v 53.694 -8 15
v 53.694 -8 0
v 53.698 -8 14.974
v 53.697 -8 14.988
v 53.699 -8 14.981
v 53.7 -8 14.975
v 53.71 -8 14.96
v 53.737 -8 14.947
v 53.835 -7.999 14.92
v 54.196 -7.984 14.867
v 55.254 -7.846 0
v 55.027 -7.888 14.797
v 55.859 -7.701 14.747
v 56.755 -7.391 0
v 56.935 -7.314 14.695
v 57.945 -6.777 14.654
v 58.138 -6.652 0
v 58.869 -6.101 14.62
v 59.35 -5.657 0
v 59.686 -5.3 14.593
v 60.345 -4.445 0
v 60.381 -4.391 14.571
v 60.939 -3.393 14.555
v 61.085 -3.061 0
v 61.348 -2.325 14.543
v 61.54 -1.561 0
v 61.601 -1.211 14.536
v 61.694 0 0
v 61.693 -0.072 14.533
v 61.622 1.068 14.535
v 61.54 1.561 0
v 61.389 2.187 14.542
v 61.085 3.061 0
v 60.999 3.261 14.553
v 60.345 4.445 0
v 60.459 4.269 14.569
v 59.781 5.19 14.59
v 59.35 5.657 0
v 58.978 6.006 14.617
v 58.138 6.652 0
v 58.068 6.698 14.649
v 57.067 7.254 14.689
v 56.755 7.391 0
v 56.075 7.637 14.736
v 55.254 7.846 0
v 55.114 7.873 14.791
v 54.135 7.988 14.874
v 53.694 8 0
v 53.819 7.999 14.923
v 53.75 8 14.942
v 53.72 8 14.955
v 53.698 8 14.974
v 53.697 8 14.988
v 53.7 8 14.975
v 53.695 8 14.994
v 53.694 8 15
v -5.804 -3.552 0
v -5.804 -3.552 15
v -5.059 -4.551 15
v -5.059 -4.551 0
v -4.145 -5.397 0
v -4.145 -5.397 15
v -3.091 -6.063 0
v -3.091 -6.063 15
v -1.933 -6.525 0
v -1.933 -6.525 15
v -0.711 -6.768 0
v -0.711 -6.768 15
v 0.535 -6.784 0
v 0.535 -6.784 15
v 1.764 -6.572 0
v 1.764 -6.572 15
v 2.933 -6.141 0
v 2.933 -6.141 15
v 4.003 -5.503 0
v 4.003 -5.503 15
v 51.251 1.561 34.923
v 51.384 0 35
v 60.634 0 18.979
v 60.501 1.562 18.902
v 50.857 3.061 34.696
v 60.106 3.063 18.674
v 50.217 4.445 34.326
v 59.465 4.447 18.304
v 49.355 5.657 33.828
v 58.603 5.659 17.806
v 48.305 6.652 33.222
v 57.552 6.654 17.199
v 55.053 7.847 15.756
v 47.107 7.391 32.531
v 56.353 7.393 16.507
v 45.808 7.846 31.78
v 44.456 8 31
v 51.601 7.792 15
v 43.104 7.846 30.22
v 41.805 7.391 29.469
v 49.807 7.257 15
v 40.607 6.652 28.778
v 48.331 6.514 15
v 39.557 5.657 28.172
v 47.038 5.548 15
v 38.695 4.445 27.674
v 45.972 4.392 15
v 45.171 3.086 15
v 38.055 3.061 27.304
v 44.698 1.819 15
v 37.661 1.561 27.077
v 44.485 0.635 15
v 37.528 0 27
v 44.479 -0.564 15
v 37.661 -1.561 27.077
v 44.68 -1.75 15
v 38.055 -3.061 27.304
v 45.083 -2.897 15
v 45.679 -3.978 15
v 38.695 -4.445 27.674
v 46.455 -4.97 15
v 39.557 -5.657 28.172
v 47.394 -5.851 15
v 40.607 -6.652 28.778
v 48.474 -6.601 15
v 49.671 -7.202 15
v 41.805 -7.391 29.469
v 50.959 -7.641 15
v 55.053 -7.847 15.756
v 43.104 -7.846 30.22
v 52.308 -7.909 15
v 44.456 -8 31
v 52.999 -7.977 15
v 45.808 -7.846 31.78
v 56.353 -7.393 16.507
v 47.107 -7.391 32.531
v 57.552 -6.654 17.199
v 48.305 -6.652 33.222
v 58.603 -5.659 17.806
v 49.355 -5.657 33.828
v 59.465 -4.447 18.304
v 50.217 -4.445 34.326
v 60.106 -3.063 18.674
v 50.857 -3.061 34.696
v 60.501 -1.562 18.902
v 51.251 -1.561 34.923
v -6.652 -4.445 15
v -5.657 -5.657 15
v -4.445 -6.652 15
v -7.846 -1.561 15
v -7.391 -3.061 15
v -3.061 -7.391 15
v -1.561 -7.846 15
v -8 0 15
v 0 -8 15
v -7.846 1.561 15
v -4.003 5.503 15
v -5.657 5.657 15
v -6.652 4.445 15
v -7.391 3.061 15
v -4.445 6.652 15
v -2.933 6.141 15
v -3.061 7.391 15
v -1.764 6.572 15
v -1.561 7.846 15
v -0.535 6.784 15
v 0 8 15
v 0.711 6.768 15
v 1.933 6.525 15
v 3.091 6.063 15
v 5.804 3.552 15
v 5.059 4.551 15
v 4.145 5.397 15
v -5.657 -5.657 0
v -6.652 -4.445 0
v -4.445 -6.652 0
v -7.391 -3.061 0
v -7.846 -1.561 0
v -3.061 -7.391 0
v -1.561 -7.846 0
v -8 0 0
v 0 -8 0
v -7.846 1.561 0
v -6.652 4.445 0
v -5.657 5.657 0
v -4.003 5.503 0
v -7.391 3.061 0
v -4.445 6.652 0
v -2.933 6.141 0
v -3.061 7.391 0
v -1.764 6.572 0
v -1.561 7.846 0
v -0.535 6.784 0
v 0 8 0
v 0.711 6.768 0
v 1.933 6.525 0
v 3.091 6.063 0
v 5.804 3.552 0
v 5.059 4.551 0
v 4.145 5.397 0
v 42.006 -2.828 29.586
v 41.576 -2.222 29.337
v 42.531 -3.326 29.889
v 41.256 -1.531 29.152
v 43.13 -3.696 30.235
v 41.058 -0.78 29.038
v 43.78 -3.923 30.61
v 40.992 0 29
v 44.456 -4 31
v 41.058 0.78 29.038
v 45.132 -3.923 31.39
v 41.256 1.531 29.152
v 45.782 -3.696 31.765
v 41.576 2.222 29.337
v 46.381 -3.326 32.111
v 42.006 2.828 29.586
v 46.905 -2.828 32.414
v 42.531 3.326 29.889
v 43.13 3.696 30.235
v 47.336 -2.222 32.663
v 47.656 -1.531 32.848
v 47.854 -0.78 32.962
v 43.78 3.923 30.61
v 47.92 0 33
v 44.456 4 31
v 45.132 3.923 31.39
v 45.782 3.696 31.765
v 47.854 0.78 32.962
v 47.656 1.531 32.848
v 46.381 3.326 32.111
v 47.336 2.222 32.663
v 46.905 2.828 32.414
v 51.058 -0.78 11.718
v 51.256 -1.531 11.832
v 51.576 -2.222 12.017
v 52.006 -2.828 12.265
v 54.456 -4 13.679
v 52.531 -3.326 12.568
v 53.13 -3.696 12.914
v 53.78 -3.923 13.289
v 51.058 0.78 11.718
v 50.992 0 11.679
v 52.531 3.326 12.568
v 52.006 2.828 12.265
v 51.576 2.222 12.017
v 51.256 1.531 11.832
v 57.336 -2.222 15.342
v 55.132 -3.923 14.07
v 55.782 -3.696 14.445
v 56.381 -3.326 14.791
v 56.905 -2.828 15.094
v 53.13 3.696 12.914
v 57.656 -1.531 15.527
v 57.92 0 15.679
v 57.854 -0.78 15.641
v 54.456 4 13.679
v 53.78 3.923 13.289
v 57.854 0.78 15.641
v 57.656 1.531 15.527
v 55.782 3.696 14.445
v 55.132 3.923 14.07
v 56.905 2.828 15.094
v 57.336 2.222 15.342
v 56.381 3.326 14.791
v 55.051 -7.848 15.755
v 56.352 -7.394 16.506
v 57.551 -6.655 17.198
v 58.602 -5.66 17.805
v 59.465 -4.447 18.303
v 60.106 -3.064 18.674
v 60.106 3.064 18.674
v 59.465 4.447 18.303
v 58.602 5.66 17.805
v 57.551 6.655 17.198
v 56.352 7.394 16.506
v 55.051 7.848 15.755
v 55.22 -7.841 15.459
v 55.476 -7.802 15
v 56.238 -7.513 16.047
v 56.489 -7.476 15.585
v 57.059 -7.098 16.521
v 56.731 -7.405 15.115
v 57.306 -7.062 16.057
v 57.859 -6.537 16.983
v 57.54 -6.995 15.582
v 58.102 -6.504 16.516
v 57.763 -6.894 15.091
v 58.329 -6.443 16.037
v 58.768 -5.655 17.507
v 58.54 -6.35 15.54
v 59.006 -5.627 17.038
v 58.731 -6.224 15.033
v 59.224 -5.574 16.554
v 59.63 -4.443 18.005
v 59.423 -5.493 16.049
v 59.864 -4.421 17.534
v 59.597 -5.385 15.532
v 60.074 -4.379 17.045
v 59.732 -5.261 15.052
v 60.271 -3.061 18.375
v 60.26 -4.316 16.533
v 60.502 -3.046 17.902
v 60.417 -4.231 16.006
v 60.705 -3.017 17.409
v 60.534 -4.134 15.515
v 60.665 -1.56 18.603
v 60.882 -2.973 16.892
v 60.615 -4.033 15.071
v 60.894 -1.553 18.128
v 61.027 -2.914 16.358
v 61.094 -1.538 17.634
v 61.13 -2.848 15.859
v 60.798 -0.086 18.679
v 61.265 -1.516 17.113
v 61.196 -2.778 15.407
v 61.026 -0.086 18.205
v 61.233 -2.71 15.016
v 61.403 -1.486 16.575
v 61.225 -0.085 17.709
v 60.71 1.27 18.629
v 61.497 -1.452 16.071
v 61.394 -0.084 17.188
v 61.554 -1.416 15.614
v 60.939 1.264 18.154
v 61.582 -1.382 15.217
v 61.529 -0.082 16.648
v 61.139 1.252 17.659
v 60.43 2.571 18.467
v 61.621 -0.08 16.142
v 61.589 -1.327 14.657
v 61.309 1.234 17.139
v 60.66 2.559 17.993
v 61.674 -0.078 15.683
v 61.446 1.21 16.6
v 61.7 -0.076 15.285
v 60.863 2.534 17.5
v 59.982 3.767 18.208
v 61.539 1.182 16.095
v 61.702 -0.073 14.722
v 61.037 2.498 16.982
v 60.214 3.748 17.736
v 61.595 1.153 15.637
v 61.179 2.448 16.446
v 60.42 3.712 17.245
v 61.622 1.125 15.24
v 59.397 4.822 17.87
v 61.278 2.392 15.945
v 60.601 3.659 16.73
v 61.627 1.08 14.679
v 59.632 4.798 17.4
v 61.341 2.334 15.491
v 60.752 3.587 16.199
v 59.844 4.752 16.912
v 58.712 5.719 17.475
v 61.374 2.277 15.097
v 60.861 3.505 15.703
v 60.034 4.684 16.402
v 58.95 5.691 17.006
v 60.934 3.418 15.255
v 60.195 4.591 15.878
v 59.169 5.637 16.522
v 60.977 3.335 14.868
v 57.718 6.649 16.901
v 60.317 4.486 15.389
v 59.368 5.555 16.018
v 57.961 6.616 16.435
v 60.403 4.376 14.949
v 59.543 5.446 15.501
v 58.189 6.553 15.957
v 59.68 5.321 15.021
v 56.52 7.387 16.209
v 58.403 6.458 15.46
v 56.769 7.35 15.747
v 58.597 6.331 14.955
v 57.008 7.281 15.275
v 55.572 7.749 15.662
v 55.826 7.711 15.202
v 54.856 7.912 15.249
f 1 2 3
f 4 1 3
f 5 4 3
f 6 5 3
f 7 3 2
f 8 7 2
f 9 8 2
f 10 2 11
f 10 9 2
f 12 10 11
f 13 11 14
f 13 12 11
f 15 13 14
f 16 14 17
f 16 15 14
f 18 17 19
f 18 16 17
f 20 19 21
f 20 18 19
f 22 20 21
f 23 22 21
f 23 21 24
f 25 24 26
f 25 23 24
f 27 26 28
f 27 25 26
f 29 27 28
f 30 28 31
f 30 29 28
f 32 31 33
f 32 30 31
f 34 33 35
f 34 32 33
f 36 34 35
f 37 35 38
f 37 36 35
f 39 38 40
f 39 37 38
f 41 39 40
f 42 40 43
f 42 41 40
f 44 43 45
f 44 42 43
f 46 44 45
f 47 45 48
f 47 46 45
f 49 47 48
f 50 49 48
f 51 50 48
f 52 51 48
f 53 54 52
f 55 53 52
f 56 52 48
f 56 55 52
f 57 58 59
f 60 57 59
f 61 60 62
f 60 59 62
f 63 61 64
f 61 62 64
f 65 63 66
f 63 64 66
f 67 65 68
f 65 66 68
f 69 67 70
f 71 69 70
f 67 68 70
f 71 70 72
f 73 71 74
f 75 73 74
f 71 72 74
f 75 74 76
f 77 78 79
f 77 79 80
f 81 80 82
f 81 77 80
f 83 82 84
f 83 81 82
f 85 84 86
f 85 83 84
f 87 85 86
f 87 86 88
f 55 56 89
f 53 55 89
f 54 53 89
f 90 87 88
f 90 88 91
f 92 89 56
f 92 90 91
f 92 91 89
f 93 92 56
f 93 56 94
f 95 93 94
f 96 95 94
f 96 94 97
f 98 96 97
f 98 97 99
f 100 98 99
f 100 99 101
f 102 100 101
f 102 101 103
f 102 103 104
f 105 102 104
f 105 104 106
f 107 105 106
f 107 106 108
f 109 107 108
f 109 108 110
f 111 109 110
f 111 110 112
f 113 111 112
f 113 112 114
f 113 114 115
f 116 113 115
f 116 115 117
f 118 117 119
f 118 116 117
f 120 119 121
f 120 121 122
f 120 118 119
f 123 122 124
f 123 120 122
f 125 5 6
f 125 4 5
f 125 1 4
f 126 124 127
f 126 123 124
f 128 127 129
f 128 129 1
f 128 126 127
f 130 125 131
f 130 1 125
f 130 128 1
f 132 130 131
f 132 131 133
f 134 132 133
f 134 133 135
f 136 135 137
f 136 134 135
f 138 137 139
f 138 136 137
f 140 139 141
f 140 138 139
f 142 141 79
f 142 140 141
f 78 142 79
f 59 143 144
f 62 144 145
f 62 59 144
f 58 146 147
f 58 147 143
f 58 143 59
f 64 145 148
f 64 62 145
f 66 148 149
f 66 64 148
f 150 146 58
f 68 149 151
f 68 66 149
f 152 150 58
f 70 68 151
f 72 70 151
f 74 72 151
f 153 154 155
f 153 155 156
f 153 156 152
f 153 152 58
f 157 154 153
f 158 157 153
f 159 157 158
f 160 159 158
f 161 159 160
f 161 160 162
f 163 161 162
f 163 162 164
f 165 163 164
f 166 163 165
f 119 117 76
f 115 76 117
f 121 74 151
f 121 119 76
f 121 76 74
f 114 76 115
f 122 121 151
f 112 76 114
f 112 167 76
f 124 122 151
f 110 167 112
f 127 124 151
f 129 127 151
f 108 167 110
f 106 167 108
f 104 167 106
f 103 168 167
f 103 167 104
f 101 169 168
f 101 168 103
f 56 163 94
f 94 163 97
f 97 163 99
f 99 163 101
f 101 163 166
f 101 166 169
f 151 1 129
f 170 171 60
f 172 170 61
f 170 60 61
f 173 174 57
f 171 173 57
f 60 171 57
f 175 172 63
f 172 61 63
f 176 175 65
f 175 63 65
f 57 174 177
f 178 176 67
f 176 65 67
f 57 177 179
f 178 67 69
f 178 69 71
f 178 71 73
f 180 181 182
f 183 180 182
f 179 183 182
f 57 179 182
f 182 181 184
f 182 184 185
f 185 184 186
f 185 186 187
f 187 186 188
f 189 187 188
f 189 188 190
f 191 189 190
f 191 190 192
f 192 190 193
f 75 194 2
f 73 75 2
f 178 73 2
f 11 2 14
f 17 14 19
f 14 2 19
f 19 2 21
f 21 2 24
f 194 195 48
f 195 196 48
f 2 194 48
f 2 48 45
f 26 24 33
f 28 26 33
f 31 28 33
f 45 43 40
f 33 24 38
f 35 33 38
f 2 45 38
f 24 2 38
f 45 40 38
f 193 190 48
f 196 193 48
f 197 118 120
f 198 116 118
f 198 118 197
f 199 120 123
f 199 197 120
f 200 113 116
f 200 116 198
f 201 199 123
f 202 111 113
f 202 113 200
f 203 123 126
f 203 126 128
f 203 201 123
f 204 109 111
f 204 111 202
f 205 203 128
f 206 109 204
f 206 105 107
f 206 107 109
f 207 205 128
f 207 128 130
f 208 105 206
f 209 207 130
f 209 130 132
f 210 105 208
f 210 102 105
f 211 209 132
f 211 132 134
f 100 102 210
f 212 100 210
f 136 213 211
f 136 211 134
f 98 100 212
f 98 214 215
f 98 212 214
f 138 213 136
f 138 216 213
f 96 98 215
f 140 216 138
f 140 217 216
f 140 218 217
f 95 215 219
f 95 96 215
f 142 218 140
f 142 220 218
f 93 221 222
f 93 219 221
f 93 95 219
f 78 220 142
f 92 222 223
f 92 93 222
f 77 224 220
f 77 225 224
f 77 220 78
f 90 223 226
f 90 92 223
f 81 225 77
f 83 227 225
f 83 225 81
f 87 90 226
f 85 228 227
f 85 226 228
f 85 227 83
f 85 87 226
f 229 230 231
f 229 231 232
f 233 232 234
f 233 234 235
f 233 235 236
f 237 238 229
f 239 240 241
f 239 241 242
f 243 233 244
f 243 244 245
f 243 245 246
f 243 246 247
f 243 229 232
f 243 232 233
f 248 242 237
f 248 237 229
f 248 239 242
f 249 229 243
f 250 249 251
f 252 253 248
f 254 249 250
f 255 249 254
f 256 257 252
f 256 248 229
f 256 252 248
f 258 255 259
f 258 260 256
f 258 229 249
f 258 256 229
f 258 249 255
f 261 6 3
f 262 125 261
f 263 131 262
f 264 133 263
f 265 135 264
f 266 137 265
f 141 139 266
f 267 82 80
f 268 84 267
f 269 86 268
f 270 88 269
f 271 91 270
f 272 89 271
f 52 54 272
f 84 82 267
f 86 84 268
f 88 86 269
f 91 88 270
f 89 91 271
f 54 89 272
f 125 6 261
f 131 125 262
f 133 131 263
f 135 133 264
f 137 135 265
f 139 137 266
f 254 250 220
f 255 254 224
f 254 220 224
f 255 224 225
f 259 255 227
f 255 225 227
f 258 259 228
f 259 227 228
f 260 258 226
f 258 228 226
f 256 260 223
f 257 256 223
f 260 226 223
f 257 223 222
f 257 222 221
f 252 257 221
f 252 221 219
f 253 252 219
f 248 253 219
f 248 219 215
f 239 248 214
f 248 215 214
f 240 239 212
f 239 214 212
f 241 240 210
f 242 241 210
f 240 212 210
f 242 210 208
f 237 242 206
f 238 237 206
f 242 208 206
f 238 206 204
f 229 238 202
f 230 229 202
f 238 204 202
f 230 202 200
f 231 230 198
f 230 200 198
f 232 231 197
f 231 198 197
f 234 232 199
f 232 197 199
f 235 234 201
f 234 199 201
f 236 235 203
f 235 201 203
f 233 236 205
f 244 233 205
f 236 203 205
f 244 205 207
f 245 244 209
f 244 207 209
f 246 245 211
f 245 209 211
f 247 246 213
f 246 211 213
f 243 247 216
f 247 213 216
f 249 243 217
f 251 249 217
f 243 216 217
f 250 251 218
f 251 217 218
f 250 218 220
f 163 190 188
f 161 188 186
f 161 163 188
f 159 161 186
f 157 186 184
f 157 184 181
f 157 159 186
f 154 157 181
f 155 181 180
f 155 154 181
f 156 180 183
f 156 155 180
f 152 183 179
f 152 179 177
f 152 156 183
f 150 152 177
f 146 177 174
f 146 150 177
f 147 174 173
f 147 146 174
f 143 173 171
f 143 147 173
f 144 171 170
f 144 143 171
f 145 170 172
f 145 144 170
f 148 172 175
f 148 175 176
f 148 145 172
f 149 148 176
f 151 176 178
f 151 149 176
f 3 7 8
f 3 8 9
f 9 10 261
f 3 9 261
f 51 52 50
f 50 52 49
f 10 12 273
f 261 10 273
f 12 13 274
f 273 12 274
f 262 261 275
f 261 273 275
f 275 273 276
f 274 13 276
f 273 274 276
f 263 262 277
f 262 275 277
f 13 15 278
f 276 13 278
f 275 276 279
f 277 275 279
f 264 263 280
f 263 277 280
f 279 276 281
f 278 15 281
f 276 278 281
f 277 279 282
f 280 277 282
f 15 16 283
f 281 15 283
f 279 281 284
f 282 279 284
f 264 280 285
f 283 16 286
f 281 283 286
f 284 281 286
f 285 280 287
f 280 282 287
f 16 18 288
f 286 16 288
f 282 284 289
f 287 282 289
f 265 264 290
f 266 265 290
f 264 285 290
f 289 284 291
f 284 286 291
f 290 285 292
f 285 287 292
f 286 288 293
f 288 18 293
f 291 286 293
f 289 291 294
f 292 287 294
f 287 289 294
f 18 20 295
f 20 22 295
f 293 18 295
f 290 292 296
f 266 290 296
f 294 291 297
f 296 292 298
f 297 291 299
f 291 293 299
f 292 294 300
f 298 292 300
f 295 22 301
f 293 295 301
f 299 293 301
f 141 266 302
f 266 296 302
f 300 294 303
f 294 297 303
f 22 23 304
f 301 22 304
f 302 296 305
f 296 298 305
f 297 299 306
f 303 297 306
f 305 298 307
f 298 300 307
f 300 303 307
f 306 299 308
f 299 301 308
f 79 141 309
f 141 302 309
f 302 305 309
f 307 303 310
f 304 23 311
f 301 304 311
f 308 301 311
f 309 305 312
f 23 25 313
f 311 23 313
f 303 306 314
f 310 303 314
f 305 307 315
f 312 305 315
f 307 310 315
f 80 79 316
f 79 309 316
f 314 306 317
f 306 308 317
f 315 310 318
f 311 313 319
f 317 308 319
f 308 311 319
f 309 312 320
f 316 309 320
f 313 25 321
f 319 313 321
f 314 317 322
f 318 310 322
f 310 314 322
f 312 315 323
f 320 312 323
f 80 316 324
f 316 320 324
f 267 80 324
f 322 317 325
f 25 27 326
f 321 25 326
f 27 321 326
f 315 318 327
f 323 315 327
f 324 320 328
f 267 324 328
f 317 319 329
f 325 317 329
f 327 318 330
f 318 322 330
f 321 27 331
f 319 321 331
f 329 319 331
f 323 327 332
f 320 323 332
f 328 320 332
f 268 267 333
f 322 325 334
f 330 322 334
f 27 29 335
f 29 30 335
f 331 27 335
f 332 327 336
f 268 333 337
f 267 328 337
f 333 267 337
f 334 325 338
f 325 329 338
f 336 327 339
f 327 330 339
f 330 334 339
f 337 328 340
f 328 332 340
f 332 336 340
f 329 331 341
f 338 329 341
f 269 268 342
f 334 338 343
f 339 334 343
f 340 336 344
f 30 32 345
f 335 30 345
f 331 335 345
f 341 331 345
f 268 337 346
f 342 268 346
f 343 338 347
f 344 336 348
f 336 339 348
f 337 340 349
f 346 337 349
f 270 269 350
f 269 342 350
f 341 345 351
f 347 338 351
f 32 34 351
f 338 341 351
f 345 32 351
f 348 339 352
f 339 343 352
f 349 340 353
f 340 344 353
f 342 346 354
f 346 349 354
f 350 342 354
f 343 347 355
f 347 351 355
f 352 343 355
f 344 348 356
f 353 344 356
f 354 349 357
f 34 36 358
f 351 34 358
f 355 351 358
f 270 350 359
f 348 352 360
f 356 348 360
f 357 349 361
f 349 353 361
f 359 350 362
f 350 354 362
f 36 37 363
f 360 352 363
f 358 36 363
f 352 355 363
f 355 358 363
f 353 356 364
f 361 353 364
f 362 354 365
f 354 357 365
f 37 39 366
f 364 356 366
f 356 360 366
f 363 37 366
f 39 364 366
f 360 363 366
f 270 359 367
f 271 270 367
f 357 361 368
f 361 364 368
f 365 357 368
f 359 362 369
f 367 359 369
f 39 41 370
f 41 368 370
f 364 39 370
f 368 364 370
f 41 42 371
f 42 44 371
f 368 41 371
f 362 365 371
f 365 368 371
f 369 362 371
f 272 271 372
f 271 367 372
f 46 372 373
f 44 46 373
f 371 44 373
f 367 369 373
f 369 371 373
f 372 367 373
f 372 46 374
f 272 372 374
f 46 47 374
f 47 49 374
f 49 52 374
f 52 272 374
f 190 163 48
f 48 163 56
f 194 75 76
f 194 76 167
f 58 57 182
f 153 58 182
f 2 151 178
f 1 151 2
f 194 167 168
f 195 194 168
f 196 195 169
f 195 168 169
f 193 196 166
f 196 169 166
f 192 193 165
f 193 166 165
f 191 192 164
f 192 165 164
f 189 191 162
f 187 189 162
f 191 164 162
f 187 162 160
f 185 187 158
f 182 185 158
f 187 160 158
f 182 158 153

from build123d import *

# Parameters (mm, degrees)
SKETCH011_R     = 8
PAD003_DEPTH    = 18.5
PAD004_DEPTH    = 15
POCKET004_DEPTH = 15.001
SKETCH015_R     = 4
POCKET005_DEPTH = 20


with BuildPart() as part:
    # Sketch011 (on DatumPlane) → Pad003 (new body)
    with BuildSketch(Plane(origin=(44.455971, 0, 0), x_dir=(0.866025, 0, 0.5), z_dir=(-0.5, 0, 0.866025))):
        Circle(SKETCH011_R)
    extrude(amount=-PAD003_DEPTH)

    # Sketch012 → Revolution001 (revolve)
    with BuildSketch(Plane.XZ):
        with BuildLine():
            ThreePointArc((46.777767, -20.02147), (51.635418, -23.748877), (57.705971, -22.949673))
            Line((53.705971, -16.02147), (57.705971, -22.949673))
            Line((46.777767, -20.02147), (53.705971, -16.02147))
        make_face()
    revolve(axis=Axis((44.455971, 0, 0), (-0.5, 0, 0.866025)))

    # Sketch013 (on DatumPlane) → Pad004 (join)
    with BuildSketch(Plane.XY.offset(-16)):
        with BuildLine():
            ThreePointArc((0, 8), (-8, 0), (0, -8))
            Line((0, -8), (53.693575, -8))
            ThreePointArc((53.693575, -8), (61.693575, 0), (53.693575, 8))
            Line((0, 8), (53.693575, 8))
        make_face()
    extrude(amount=-PAD004_DEPTH)

    # Sketch014 (on DatumPlane) → Pocket004 (cut, through all)
    with BuildSketch(Plane.XY.offset(-16)):
        with BuildLine():
            ThreePointArc((5.804447, 3.551769), (1.32757, 6.674146), (-4.003406, 5.502672))
            Line((-5.804447, -3.551769), (-4.003406, 5.502672))
            ThreePointArc((-5.804447, -3.551769), (-1.32757, -6.674146), (4.003406, -5.502672))
            Line((4.003406, -5.502672), (5.804447, 3.551769))
        make_face()
    extrude(amount=-POCKET004_DEPTH, mode=Mode.SUBTRACT)

    # Sketch015 (on Face6 of Pocket004) → Pocket005 (cut)
    with BuildSketch(Plane(origin=(44.455971, 0, 0), x_dir=(0.866025, 0, 0.5), z_dir=(-0.5, 0, 0.866025))):
        Circle(SKETCH015_R)
    extrude(amount=-POCKET005_DEPTH, mode=Mode.SUBTRACT)


with BuildPart() as part_1:
    # Body002 placement: moved
    add(part.part.moved(Location((0, 0, 31))))


solid = part_1.part
